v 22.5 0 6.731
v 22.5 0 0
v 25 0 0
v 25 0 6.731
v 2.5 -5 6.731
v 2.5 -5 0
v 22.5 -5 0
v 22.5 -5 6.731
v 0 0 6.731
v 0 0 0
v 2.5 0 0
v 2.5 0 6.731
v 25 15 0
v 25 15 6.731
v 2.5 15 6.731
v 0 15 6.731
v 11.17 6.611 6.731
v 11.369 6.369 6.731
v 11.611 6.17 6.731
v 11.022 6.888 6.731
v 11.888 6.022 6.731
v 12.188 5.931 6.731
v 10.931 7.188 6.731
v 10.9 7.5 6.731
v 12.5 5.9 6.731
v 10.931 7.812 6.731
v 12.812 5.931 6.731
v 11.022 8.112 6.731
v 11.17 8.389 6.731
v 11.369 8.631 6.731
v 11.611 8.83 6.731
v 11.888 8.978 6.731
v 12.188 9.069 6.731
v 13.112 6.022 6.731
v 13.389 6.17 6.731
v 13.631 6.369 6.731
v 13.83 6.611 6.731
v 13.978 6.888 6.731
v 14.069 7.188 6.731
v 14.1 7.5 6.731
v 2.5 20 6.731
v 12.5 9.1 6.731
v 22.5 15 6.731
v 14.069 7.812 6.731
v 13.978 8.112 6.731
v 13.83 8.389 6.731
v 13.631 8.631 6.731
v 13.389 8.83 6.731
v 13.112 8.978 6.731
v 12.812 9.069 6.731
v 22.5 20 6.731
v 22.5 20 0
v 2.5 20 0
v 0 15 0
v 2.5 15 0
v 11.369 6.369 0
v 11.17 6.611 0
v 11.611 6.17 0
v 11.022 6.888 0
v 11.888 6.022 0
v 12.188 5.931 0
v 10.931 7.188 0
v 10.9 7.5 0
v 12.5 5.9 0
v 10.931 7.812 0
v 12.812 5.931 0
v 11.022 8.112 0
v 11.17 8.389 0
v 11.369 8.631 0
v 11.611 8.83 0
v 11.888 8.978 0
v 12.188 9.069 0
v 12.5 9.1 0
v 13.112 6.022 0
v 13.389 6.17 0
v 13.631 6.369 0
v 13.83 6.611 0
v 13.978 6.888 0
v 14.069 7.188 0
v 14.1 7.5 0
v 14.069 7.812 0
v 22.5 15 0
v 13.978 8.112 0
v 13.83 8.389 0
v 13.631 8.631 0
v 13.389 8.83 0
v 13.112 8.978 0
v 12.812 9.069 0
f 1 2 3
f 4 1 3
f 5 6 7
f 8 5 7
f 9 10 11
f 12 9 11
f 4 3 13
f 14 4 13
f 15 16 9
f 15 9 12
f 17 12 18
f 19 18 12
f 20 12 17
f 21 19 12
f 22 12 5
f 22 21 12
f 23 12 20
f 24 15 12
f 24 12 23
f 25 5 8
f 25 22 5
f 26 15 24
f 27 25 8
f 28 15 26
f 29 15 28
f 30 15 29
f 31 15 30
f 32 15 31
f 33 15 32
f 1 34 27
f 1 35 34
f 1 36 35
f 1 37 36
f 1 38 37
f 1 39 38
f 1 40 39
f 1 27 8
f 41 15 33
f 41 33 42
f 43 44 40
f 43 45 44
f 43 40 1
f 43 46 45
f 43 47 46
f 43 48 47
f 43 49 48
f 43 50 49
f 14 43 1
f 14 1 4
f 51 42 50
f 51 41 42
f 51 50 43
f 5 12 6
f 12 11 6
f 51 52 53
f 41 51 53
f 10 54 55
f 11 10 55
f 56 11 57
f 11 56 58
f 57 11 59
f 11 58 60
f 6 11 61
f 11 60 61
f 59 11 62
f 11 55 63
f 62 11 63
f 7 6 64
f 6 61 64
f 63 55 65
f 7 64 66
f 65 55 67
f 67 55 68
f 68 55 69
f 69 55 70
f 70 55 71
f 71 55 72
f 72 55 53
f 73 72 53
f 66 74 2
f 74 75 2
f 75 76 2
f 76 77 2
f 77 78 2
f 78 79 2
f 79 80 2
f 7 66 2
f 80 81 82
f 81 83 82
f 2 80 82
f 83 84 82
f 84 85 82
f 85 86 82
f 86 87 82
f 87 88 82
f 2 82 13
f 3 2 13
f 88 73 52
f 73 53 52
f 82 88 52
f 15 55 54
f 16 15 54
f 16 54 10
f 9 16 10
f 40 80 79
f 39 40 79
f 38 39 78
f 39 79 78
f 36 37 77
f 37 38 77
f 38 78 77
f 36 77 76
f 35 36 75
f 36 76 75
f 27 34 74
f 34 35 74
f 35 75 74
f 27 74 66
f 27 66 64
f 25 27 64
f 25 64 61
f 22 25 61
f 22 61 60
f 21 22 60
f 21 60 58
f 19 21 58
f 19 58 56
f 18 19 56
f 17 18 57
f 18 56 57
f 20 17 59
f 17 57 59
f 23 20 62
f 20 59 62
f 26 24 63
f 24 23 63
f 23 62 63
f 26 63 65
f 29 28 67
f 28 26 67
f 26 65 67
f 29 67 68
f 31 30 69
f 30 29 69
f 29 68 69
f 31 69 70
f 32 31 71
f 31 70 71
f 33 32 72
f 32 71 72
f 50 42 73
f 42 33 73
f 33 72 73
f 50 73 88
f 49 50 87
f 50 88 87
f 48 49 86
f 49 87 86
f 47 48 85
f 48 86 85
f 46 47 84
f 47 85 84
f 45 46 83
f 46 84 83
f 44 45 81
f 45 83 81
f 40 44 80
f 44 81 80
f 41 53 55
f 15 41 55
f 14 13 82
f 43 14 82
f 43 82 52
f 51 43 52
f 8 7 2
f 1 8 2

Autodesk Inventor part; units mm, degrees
ref_plane "YZ Plane" through (0, 0, 0) normal (1, 0, 0) x (0, 1, 0)
ref_plane "XZ Plane" through (0, 0, 0) normal (0, 1, 0) x (-1, 0, 0)
ref_plane "XY Plane" through (0, 0, 0) normal (0, 0, 1) x (1, 0, 0)
sketch "Sketch1" plane through (0, 0, 0) normal (0, 0, 1) x (1, 0, 0)
  line L0 (0, 0) -> (2.5, 0)
  line L1 (2.5, 0) -> (2.5, -5)
  line L2 (2.5, -5) -> (22.5, -5)
  line L3 (22.5, -5) -> (22.5, 0)
  line L4 (22.5, 0) -> (25, 0)
  line L5 (25, 0) -> (25, 15)
  line L6 (25, 15) -> (22.5, 15)
  line L7 (22.5, 15) -> (22.5, 20)
  line L8 (22.5, 20) -> (2.5, 20)
  line L9 (2.5, 20) -> (2.5, 15)
  line L10 (2.5, 15) -> (0, 15)
  line L11 (0, 15) -> (0, 0)
  circle A0 centre (12.5, 7.5) radius 1.6
  point P0 (0, 7.5)
  point P1 (12.5, 20)
  dimension "d0" = 20
  dimension "d1" = 15
  dimension "d2" = 25
  dimension "d3" = 5
  dimension "d4" = 3.2
extrude "Extrusion1" add sketch "Sketch1" along normal blind 6.731
equation "\"d10\" = THICKB"
equation "\"THICKA\" = 3.175"
equation "\"THICKB\" = 6.731"
equation "\"THICKC\" = 12.7"
equation "\"BALLDIA\" = 12"
equation "\"MAGDIA\" = 9.5"
equation "\"THICKPLY\" = 5"
properties part number "Frame_Upper_Plate_Pulley_A"
